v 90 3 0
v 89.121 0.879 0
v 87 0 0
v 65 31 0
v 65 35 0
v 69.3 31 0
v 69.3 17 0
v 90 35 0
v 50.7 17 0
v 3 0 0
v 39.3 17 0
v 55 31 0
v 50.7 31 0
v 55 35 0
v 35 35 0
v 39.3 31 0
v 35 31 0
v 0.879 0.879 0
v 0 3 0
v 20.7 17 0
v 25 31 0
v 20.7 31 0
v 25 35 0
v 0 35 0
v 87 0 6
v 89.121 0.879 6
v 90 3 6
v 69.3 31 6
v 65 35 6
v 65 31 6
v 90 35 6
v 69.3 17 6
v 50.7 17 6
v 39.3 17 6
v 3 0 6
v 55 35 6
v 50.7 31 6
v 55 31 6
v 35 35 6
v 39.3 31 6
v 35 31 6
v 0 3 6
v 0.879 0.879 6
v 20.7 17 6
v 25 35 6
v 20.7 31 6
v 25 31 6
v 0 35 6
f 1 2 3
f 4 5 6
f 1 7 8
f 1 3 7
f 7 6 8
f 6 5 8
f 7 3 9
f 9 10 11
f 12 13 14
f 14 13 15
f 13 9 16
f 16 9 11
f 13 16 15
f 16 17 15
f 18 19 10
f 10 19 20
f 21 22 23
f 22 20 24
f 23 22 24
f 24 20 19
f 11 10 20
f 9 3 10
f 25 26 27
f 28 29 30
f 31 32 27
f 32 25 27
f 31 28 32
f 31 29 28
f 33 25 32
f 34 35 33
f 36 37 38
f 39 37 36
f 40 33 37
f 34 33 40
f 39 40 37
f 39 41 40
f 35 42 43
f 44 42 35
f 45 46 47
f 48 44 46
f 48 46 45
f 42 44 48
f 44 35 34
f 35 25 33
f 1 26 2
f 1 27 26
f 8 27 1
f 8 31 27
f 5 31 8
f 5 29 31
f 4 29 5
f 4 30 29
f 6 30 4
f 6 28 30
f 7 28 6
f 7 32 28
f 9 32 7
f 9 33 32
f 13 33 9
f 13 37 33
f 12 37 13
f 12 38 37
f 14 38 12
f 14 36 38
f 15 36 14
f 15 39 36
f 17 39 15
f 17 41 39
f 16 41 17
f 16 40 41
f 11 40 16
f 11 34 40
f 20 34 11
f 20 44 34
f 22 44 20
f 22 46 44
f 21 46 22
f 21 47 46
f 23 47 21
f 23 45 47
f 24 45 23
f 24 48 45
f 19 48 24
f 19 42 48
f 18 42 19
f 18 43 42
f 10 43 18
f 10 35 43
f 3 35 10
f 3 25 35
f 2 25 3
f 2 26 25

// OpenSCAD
$fn = 32;

// ----------------------------------------------------------------------
// Window plate: 90 x 35 mm, 2 open windows
// ----------------------------------------------------------------------

// --- parameters (mm) ---
profile_height = 6;       // extrusion height
profile_points = 24;      // points of the closed outline

profile = [[0, 3], [0.879, 0.879], [3, 0], [87, 0], [89.121, 0.879], [90, 3], [90, 35], [65, 35], [65, 31], [69.3, 31], [69.3, 17], [50.7, 17], [50.7, 31], [55, 31], [55, 35], [35, 35], [35, 31], [39.3, 31], [39.3, 17], [20.7, 17], [20.7, 31], [25, 31], [25, 35], [0, 35]];  // single closed polygon, 24 points, counter clockwise

// --- the one profile operation ---
linear_extrude(height = profile_height) polygon(points = profile);
